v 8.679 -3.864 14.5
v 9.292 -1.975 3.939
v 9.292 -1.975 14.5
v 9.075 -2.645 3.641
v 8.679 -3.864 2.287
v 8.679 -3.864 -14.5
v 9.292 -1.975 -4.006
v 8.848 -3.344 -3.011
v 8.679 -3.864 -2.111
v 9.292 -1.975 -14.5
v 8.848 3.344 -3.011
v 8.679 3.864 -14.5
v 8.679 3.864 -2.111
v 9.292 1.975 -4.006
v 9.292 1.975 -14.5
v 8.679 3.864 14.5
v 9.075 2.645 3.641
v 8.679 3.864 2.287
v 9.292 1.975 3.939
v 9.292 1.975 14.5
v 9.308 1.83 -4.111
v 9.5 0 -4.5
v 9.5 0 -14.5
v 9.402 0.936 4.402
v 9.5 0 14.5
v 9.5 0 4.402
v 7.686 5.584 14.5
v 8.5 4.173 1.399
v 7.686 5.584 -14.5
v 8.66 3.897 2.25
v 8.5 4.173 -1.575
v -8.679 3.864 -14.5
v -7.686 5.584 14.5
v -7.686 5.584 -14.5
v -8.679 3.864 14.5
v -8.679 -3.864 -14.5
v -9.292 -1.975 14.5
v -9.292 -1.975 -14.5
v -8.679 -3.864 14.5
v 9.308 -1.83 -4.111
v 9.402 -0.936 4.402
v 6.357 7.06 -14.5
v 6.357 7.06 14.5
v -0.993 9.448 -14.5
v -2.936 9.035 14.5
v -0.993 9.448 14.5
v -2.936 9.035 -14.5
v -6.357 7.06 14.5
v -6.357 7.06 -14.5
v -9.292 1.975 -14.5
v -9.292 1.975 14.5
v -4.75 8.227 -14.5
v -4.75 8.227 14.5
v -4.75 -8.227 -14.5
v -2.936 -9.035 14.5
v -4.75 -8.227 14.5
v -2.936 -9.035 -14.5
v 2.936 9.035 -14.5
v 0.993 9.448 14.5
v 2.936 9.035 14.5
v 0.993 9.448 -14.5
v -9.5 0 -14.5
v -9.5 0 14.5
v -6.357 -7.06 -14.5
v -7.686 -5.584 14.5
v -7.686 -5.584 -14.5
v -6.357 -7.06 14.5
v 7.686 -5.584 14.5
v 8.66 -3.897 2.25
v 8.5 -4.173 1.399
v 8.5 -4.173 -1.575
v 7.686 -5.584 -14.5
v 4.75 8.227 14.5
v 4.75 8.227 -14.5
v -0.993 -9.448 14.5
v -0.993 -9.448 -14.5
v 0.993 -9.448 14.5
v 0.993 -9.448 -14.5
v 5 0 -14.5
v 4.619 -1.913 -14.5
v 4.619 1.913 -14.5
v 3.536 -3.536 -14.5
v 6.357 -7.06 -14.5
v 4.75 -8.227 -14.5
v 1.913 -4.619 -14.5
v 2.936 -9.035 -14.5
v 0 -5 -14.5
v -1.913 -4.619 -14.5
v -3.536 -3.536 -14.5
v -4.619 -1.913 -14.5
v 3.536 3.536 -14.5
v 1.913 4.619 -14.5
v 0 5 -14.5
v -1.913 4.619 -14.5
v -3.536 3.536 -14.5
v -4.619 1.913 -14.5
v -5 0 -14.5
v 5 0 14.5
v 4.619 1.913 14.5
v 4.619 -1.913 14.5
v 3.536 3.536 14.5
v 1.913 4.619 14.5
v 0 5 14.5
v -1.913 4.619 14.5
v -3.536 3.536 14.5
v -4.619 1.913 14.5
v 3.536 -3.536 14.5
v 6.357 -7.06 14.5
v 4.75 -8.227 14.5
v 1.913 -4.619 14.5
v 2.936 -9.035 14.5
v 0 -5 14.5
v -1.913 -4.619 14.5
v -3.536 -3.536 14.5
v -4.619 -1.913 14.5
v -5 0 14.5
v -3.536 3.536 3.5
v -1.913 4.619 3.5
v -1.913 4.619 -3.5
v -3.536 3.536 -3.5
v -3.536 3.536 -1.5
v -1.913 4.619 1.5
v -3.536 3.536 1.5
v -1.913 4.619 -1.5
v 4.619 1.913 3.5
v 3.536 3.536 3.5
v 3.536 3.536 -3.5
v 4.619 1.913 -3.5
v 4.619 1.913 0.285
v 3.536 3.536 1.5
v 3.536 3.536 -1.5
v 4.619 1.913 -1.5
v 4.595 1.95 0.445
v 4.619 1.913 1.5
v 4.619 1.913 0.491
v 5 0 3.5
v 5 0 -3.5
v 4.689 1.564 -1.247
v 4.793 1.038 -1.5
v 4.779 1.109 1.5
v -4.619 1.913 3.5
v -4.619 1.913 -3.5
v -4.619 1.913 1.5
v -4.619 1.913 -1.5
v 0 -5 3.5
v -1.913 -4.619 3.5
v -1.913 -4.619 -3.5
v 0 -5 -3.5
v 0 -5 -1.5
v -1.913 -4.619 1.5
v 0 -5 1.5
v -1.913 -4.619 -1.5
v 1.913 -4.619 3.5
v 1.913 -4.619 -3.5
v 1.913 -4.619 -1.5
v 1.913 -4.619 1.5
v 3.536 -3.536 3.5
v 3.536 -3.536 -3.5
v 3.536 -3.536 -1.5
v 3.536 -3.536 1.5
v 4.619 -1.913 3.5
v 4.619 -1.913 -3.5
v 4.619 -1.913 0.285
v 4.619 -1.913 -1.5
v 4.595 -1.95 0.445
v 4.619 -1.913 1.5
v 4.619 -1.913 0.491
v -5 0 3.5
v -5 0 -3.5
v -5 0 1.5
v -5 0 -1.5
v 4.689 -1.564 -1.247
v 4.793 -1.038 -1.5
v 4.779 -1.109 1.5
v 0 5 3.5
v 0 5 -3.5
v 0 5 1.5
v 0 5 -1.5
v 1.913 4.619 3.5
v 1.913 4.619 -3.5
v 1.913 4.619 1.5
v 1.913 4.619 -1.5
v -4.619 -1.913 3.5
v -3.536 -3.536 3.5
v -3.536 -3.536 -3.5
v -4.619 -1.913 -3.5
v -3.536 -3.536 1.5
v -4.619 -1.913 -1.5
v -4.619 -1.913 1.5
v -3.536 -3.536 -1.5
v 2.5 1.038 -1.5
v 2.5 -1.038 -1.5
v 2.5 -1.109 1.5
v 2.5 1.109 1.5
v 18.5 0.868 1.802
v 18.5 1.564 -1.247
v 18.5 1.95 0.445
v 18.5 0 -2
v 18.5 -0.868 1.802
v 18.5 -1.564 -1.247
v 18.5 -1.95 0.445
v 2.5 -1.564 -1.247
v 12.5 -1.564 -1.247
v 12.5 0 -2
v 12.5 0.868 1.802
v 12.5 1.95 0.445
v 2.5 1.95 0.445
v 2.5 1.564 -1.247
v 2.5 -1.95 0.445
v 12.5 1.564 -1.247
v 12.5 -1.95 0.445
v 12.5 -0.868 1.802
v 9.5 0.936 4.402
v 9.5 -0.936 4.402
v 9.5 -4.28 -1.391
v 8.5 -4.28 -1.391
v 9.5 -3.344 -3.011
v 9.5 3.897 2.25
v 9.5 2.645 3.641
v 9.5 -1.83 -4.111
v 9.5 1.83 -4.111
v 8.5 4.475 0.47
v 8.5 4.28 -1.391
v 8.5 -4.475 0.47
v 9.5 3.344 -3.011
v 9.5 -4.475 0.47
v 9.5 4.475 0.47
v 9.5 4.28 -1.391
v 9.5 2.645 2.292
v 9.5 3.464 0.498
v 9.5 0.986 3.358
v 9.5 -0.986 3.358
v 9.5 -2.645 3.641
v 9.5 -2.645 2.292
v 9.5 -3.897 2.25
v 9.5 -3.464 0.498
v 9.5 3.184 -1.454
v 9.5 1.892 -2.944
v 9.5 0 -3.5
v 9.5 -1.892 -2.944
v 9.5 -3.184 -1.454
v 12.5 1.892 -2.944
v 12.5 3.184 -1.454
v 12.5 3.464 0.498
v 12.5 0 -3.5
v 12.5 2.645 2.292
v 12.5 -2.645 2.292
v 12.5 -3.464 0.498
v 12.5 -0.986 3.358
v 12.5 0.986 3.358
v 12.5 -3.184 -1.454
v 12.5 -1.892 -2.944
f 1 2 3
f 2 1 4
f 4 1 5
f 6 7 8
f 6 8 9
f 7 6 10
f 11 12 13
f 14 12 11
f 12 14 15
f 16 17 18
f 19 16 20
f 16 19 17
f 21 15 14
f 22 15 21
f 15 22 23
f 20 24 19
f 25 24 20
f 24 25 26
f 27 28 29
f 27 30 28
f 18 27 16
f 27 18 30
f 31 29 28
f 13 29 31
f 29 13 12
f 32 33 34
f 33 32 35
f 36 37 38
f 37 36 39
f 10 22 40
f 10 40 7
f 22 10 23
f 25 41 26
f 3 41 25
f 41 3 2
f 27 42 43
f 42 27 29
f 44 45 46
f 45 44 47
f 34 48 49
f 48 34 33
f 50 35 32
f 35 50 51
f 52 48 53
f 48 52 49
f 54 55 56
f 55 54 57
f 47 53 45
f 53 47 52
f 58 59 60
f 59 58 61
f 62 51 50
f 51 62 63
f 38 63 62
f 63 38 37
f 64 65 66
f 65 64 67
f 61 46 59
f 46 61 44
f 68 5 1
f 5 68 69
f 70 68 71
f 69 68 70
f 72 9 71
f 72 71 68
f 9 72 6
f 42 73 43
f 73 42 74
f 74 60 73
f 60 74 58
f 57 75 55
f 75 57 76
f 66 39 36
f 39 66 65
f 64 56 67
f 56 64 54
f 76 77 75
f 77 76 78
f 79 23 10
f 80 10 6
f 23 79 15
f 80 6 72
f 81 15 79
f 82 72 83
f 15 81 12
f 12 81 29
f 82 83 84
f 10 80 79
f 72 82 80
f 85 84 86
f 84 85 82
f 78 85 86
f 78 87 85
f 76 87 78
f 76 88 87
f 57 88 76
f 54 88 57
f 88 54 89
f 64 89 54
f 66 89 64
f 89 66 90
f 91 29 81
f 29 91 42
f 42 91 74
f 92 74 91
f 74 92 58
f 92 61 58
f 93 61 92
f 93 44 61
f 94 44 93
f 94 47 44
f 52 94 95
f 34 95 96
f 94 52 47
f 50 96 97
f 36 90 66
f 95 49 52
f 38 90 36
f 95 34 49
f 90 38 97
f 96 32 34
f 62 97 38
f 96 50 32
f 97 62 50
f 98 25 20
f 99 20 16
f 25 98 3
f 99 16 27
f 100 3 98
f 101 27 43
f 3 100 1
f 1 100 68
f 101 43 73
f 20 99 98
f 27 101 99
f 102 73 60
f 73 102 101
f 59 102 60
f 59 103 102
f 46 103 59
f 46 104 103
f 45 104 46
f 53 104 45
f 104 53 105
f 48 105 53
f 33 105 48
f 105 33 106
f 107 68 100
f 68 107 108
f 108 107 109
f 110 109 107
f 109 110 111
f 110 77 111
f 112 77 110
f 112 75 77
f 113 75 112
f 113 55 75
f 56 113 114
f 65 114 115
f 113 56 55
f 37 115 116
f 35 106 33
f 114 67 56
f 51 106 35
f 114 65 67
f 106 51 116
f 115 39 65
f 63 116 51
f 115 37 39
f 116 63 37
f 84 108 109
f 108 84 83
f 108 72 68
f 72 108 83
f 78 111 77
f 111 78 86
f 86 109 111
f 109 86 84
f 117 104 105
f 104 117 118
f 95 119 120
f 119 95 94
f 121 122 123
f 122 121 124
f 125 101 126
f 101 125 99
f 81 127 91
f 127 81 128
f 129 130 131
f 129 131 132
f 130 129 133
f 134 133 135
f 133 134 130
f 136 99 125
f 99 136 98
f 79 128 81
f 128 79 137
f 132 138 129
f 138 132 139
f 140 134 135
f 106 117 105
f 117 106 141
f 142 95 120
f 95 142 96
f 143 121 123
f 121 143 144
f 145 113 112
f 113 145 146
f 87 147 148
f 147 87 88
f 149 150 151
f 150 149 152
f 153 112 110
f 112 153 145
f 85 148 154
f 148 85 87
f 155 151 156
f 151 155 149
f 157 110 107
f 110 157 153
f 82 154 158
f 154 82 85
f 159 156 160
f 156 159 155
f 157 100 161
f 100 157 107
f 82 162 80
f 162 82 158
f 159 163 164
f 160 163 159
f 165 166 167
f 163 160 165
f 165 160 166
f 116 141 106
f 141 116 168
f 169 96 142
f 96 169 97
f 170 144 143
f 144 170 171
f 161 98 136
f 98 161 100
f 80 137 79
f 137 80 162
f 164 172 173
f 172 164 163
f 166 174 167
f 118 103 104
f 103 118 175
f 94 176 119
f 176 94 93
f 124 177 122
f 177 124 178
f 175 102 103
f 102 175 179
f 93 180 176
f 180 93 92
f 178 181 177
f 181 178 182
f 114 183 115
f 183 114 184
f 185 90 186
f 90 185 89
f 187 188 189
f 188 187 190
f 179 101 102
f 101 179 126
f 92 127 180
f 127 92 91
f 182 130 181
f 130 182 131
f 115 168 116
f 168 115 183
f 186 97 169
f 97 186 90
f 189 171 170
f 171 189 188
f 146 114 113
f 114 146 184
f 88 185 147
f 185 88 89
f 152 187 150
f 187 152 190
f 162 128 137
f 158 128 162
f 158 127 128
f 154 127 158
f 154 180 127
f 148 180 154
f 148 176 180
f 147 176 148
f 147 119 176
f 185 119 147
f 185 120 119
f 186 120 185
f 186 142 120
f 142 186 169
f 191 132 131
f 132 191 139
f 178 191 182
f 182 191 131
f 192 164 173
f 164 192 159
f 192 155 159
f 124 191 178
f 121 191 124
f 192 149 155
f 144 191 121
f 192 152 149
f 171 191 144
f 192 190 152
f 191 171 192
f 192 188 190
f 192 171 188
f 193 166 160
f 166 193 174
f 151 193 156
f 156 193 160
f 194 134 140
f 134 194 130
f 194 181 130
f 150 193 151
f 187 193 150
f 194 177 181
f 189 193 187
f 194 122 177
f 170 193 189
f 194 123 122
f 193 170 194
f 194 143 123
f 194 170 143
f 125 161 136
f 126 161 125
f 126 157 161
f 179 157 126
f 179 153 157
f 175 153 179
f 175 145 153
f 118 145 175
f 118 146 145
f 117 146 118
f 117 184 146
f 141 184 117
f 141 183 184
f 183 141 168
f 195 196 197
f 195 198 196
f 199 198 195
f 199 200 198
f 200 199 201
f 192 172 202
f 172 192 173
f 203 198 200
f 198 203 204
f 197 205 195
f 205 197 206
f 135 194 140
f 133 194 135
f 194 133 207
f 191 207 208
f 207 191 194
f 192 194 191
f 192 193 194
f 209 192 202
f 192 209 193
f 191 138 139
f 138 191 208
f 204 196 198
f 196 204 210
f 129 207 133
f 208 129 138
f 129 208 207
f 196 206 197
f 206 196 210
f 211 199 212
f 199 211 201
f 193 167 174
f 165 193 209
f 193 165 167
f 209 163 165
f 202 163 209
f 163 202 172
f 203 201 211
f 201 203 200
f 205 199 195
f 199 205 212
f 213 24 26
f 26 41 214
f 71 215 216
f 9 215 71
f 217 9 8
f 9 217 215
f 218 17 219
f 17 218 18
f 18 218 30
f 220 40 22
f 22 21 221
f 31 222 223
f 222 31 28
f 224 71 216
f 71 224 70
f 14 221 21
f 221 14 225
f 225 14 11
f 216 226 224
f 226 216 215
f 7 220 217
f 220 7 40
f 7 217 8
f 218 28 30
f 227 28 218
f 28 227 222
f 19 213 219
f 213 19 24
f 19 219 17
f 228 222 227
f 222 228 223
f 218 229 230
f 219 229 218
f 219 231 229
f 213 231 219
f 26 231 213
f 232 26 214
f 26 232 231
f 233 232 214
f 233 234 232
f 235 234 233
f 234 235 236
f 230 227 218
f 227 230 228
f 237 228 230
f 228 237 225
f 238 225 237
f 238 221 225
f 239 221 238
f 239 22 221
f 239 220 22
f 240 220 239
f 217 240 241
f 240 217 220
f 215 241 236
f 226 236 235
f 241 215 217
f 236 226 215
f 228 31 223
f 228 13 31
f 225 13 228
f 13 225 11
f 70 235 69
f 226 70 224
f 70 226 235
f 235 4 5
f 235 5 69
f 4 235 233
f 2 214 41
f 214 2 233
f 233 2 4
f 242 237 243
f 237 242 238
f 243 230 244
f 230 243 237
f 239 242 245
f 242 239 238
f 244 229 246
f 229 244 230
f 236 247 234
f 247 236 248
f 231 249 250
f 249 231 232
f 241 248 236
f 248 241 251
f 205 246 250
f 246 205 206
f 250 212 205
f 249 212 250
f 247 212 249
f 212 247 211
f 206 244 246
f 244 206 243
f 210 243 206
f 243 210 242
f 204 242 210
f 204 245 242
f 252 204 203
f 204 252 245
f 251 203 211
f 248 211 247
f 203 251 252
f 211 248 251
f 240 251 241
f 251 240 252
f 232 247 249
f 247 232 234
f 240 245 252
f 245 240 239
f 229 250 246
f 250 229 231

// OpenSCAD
// Parameters
bore_diameter_mm = 10.0; //[5.0:20.0:0.1]
outer_diameter_mm = 19.0; //[10.0:38.0:0.1]
length_mm = 29.0; //[15.0:58.0:0.1]
casing_thickness_mm = 1.9; //[0.8:4.0:0.1]
seal_length_reduction_mm = 0.5; //[0.2:2.0:0.1]
seal_outer_scale = 1.12; //[1.02:1.3:0.01]
groove_outer_diameter_mm = 20.0; //[19.0:24.0:0.1]
groove_length_mm = 2.0; //[1.0:5.0:0.1]
groove_spacing_mm = 22.0; //[10.0:40.0:0.1]
overlap_mm = 1.0; //[0.5:2.0:0.1]
screw_shank_diameter_mm = 4.0; //[2.0:8.0:0.1]
screw_length_mm = 16.0; //[6.0:40.0:0.1]
screw_head_diameter_mm = 7.0; //[4.0:14.0:0.1]
screw_head_height_mm = 3.0; //[1.5:8.0:0.1]
washer_outer_diameter_mm = 9.0; //[5.0:18.0:0.1]
washer_thickness_mm = 1.0; //[0.5:3.0:0.1]

// Linear Bearing - complete geometry
module linear_bearing() {
  color([0.85, 0.85, 0.8]) {
    difference() {
      // Outer body
      cylinder(h=length_mm, r=outer_diameter_mm/2, center=true);
      // Through bore
      cylinder(h=length_mm + 2*overlap_mm, r=bore_diameter_mm/2, center=true);
    }
    // Seal ring
    intersection() {
      difference() {
        cylinder(h=length_mm, r=(bore_diameter_mm/2)*seal_outer_scale, center=true);
        cylinder(h=length_mm + 2*overlap_mm, r=bore_diameter_mm/2, center=true);
      }
      cylinder(h=length_mm, r=outer_diameter_mm/2, center=true);
    }
    // Grooves
    intersection() {
      union() {
        translate([0, 0, groove_spacing_mm/2 - length_mm/2 + groove_length_mm/2])
          cylinder(h=groove_length_mm, r=groove_outer_diameter_mm/2, center=true);
        translate([0, 0, -(groove_spacing_mm/2 - length_mm/2 + groove_length_mm/2)])
          cylinder(h=groove_length_mm, r=groove_outer_diameter_mm/2, center=true);
      }
      cylinder(h=length_mm, r=outer_diameter_mm/2, center=true);
    }
  }
}

// Screw and Washer - complete geometry
module screw_and_washer() {
  color("Silver") {
    union() {
      // Screw shank
      translate([outer_diameter_mm/2 + screw_shank_diameter_mm/2 - overlap_mm, 0, 0])
        rotate([0, 90, 0])
        cylinder(h=screw_length_mm, r=screw_shank_diameter_mm/2, center=true);
      // Washer
      translate([outer_diameter_mm/2 + washer_thickness_mm/2 - overlap_mm, 0, 0])
        rotate([0, 90, 0])
        cylinder(h=washer_thickness_mm, r=washer_outer_diameter_mm/2, center=true);
      // Screw head
      translate([outer_diameter_mm/2 + washer_thickness_mm + screw_head_height_mm/2 - overlap_mm, 0, 0])
        rotate([0, 90, 0])
        cylinder(h=screw_head_height_mm, r=screw_head_diameter_mm/2, center=true);
    }
  }
}

// Assembly
module assembly() {
  linear_bearing();
  screw_and_washer();
}

assembly();
